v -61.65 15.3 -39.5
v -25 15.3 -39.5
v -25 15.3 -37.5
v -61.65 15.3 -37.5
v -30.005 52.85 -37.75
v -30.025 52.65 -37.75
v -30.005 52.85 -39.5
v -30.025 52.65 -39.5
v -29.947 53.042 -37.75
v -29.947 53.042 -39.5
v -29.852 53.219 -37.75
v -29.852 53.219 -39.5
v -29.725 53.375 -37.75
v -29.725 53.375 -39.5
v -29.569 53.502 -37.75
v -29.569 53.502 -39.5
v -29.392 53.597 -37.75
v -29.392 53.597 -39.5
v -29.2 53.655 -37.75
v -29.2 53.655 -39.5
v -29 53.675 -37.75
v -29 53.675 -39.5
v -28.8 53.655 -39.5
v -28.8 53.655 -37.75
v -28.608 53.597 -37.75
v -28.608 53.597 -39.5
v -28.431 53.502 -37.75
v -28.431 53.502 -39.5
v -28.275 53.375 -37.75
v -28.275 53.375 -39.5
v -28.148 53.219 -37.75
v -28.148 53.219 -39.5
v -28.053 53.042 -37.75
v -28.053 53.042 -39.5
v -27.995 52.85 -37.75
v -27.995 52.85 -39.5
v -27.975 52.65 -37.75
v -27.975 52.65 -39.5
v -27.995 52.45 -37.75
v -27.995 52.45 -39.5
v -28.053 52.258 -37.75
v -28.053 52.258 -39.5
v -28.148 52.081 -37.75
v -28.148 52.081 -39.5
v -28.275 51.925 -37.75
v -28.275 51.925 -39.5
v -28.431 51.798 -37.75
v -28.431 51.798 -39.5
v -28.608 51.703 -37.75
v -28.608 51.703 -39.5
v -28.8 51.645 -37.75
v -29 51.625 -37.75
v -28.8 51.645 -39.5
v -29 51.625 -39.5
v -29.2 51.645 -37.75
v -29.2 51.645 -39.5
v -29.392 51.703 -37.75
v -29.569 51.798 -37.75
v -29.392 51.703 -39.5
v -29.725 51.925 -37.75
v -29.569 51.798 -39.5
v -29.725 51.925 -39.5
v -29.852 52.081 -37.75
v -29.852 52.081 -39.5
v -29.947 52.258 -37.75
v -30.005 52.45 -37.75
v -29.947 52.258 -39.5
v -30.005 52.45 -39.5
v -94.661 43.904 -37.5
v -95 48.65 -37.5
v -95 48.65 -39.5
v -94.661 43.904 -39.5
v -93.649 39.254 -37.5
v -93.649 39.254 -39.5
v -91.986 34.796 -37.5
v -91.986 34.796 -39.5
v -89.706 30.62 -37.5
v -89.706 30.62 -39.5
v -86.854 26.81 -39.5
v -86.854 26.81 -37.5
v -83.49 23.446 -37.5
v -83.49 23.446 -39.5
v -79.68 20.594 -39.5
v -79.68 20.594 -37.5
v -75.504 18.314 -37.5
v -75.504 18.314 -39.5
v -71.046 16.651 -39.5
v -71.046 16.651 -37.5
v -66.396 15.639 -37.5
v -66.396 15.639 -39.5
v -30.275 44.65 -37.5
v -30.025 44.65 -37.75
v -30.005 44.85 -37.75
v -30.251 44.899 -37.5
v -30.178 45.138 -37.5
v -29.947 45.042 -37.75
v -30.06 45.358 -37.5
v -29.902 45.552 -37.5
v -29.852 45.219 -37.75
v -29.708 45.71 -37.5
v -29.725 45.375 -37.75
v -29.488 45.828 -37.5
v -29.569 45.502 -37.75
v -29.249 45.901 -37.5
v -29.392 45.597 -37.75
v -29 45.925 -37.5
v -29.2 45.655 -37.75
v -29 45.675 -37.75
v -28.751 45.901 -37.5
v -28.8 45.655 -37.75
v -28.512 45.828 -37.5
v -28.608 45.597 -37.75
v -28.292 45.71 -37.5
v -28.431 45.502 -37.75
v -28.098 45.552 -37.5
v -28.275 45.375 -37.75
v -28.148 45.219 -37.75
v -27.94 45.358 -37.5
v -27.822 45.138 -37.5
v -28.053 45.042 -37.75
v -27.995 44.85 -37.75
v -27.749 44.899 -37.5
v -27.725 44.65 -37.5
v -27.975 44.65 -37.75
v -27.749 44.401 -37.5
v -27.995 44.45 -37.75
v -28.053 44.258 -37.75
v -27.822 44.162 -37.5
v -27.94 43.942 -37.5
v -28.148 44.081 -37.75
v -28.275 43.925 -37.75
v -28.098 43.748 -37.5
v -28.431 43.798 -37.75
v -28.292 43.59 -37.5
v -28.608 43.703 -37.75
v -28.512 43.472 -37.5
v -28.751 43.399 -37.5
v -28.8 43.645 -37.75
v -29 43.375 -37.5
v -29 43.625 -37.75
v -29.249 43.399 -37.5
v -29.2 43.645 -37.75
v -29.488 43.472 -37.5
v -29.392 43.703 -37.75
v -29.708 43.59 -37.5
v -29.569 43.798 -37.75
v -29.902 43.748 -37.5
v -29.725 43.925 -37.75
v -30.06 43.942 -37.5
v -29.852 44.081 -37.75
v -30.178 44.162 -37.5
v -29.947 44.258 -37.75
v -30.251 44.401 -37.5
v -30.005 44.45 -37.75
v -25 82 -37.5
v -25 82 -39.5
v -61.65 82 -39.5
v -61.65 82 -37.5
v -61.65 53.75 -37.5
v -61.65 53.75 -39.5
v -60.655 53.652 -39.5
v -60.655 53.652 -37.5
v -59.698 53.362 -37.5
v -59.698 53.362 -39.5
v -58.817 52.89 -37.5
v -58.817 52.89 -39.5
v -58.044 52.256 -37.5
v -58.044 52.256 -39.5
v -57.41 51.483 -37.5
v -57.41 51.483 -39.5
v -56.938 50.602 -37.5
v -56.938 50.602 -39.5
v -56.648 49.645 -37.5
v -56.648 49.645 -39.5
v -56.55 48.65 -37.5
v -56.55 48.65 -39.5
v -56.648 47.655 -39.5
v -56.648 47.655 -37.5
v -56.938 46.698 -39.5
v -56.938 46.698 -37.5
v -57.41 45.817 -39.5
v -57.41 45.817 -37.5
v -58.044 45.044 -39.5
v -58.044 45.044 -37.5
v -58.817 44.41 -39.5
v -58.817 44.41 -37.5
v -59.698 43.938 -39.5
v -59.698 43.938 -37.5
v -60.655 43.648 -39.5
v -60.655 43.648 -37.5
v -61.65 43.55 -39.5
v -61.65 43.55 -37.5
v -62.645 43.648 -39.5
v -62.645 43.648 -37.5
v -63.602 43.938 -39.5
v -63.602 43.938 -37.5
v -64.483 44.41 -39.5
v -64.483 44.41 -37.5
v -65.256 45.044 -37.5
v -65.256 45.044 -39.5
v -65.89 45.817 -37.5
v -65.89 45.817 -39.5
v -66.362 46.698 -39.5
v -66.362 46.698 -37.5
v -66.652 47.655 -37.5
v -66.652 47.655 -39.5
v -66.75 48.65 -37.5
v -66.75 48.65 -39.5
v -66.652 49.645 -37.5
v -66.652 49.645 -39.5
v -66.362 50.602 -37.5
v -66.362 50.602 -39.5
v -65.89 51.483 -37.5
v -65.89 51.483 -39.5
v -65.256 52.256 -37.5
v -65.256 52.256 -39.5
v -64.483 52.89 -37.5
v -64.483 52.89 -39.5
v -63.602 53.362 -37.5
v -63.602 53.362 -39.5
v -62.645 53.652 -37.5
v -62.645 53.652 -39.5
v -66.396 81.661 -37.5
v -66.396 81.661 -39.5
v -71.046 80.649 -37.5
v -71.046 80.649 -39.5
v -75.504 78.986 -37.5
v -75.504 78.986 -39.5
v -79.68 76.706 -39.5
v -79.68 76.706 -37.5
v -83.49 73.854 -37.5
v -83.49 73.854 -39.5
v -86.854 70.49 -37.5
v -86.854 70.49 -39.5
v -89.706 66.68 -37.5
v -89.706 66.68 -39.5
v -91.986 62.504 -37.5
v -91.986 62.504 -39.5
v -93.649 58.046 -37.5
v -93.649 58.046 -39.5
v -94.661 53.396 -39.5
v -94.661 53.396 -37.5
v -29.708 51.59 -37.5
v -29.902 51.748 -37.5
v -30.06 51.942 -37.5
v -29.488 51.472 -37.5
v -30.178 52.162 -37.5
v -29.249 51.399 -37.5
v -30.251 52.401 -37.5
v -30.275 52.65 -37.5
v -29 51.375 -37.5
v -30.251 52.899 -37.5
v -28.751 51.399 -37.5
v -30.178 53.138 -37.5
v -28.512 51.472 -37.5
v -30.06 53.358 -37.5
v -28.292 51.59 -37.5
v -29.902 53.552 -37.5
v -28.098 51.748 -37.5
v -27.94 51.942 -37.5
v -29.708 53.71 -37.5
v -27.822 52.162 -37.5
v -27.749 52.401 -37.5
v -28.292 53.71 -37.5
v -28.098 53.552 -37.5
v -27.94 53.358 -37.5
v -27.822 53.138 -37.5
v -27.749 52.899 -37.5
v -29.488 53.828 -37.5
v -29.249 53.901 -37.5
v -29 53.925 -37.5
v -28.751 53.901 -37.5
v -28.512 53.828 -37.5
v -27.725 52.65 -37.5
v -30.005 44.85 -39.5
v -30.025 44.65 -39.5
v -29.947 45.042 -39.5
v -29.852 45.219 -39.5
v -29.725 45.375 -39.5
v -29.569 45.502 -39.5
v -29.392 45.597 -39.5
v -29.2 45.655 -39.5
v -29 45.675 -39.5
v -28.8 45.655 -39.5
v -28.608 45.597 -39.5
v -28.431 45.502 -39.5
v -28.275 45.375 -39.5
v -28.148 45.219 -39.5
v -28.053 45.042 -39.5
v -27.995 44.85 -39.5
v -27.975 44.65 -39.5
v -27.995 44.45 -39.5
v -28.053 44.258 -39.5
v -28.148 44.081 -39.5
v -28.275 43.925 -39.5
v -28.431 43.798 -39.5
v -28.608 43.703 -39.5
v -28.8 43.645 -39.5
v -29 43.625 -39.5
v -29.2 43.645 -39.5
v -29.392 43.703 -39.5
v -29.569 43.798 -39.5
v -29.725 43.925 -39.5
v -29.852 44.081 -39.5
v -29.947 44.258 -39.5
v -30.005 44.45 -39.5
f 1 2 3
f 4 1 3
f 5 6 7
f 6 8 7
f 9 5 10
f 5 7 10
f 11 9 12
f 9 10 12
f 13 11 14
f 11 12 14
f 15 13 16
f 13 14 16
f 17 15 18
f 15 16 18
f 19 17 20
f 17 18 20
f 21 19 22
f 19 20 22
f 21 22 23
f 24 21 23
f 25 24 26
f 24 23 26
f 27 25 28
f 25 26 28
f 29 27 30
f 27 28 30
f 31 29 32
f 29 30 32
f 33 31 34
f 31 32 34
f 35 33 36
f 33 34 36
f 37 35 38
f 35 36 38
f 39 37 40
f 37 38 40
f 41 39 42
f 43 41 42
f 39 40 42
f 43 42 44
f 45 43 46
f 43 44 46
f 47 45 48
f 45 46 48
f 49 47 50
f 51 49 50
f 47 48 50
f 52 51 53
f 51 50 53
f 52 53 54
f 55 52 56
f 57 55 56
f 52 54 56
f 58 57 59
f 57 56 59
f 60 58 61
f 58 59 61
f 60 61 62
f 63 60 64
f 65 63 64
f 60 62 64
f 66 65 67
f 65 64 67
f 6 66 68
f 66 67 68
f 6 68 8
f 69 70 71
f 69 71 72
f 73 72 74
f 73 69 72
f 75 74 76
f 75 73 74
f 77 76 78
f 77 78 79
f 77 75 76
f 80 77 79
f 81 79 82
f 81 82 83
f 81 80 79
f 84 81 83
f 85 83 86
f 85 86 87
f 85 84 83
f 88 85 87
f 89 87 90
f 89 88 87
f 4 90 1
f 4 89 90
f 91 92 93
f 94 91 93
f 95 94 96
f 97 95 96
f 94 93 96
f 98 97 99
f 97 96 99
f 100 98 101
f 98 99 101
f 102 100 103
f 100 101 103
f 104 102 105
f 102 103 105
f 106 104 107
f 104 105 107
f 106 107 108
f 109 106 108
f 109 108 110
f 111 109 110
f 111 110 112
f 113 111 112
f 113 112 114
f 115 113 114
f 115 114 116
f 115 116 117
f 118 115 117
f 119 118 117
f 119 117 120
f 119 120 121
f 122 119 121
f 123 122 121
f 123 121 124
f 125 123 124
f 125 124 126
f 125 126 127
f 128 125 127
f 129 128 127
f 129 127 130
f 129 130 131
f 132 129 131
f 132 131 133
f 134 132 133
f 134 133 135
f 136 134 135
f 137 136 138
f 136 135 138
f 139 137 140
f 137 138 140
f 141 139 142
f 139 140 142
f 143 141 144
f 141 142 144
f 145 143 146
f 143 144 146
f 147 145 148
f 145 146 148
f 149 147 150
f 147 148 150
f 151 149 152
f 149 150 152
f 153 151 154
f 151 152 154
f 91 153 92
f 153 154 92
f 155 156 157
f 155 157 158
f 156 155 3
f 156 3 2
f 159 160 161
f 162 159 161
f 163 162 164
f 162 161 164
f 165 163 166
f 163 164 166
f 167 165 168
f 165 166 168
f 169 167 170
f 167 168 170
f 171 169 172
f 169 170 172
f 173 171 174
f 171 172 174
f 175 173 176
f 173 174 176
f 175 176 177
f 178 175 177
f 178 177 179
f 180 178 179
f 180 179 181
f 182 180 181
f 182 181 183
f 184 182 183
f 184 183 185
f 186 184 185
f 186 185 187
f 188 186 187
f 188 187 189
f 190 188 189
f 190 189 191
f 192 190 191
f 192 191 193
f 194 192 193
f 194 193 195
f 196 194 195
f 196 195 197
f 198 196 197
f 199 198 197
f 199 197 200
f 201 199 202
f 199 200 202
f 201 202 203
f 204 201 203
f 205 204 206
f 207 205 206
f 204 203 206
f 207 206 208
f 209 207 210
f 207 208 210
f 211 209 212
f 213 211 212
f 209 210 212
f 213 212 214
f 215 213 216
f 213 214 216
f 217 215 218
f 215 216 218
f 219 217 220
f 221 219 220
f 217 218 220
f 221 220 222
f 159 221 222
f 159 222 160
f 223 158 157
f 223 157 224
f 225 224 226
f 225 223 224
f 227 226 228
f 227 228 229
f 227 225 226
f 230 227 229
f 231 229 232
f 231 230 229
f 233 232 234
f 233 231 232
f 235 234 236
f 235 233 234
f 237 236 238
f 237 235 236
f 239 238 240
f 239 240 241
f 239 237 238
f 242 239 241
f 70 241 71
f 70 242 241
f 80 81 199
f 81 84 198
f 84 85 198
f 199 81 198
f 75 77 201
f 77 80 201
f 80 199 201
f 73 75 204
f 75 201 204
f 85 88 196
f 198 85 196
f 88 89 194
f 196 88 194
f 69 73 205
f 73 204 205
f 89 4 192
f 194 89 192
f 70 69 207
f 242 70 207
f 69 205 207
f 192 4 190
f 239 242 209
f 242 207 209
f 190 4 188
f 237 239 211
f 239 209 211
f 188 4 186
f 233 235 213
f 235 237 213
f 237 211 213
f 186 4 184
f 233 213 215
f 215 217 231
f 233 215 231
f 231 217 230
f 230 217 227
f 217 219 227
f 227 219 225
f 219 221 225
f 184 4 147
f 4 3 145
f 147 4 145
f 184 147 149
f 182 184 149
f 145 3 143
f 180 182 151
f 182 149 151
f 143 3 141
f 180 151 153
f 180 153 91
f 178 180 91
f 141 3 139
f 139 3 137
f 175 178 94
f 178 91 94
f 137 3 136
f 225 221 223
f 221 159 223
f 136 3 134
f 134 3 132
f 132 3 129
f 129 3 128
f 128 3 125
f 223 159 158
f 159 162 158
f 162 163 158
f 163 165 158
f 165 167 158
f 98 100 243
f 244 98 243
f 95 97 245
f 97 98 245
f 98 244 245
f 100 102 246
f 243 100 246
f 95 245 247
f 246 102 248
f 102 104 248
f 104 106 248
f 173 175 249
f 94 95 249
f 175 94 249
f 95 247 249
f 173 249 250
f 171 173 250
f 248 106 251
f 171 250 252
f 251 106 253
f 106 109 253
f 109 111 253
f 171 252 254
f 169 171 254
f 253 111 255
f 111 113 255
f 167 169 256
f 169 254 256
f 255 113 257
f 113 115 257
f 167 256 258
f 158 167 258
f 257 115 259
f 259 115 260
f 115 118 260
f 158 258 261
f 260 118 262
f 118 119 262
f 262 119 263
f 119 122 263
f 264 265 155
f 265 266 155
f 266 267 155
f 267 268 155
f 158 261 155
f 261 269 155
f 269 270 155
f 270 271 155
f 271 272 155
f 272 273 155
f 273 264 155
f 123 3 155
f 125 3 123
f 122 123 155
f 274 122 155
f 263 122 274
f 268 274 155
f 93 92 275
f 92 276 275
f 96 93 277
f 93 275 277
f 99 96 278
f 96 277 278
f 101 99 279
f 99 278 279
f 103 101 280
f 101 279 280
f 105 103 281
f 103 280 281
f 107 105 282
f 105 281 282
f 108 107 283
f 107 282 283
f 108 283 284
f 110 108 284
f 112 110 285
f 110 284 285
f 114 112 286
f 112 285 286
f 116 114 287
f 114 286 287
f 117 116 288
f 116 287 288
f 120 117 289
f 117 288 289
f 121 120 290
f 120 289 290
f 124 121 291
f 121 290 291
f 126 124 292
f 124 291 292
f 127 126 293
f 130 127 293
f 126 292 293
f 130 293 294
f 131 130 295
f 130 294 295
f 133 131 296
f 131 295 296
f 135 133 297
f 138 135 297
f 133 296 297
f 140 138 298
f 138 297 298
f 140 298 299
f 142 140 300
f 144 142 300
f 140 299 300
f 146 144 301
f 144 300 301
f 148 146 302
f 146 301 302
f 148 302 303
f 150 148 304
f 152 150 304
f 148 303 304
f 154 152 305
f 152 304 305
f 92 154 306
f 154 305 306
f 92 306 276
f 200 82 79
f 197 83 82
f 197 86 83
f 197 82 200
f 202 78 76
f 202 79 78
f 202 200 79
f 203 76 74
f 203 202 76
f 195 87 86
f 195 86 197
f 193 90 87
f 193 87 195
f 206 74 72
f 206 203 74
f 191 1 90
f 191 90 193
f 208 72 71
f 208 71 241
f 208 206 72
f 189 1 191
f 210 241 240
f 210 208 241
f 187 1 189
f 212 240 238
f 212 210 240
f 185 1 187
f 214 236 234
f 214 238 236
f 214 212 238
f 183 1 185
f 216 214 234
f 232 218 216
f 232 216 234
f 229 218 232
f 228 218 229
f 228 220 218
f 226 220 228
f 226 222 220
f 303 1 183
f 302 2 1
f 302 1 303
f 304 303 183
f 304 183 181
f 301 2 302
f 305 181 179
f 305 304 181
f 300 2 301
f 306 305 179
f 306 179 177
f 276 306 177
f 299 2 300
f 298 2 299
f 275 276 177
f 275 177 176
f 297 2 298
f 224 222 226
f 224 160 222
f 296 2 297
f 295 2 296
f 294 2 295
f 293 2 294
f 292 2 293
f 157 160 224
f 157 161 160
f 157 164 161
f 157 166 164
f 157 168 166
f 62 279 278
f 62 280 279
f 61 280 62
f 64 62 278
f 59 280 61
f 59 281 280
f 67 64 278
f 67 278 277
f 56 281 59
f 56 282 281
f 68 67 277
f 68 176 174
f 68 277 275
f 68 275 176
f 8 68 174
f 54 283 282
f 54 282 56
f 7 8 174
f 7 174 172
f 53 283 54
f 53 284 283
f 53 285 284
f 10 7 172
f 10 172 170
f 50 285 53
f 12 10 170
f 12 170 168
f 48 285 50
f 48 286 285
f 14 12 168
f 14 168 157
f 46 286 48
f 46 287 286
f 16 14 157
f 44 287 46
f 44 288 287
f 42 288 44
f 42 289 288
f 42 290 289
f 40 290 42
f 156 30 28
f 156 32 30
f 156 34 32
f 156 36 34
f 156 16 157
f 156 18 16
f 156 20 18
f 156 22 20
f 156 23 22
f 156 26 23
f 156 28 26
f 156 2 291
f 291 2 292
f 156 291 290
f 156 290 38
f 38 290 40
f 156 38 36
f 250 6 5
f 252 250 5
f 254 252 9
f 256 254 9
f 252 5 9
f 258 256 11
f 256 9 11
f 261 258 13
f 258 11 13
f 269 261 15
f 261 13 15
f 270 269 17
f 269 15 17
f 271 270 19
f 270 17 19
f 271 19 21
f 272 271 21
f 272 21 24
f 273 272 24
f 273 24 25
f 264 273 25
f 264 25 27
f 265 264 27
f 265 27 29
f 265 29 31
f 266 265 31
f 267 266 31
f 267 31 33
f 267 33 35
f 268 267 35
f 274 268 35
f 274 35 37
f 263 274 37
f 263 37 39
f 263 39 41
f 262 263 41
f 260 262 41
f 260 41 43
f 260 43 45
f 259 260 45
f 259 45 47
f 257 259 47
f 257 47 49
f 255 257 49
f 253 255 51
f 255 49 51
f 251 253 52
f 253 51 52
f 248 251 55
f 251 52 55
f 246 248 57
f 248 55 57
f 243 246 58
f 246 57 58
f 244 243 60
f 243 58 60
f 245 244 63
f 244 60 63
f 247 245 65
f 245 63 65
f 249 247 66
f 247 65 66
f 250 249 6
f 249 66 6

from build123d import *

# Parameters (mm, degrees)
SKETCH_1_W                     = 50
SKETCH_1_H                     = 100
EXTRUDE_1_DEPTH                = 2
SKETCH_2_W                     = 3
SKETCH_2_H                     = 100
EXTRUDE_2_DEPTH                = 80
SKETCH_3_W                     = 2
SKETCH_3_H                     = 66.7
EXTRUDE_3_DEPTH                = 70
CUT_EXTRUDE_4_REACH            = 162.465
SKETCH_8_W                     = 2
SKETCH_8_H                     = 66.7
EXTRUDE_4_DEPTH                = 70
CUT_EXTRUDE_5_REACH            = 140.25
HOLE_WIZARD_M3_1_D             = 2.5
HOLE_WIZARD_M3_1_DEPTH         = 2
HOLE_WIZARD_M3_1_CSINK_D       = 3.05
HOLE_WIZARD_M3_1_CSINK_ANGLE   = 90
FILLET_1_R                     = 2
CUT_EXTRUDE_6_REACH            = 140.25
SKETCH_12_R                    = 11
CUT_EXTRUDE_7_REACH            = 162.465
SKETCH_13_R                    = 14.5
SKETCH_14_W                    = 2
SKETCH_14_H                    = 66.7
EXTRUDE_5_DEPTH                = 70
CUT_EXTRUDE_8_REACH            = 156.14
SKETCH_15_R                    = 5.1
CUT_EXTRUDE_9_DEPTH            = 155.140358116
CUT_EXTRUDE_9_DEPTH_BACK       = 155.140358116
SKETCH_19_W                    = 2
SKETCH_19_H                    = 66.7
CUT_EXTRUDE_10_DEPTH           = 119.844436134
FILLET_2_R                     = 2
CUT_EXTRUDE_11_DEPTH           = 134.88427839
CUT_EXTRUDE_11_DEPTH_BACK      = 134.88427839
HOLE_WIZARD_M2_5_1_D           = 2.05
HOLE_WIZARD_M2_5_1_CSINK_D     = 2.55
HOLE_WIZARD_M2_5_1_CSINK_ANGLE = 90


with BuildPart() as part:
    # 草图1 → 凸台-拉伸1 (new body)
    with BuildSketch(Plane(origin=(0, 0, 0), x_dir=(1, 0, 0), z_dir=(0, 1, 0))):
        Rectangle(SKETCH_1_W, SKETCH_1_H)
    extrude(amount=EXTRUDE_1_DEPTH)

    # 草图2 → 凸台-拉伸2 (add)
    with BuildSketch(Plane(origin=(0, 2, 0), x_dir=(1, 0, 0), z_dir=(0, 1, 0))):
        with Locations((-23.5, 0)):
            Rectangle(SKETCH_2_W, SKETCH_2_H)
    extrude(amount=EXTRUDE_2_DEPTH)

    # 草图3 → 凸台-拉伸3 (add)
    with BuildSketch(Plane.ZY.offset(25)):
        with Locations((-49, 48.65)):
            Rectangle(SKETCH_3_W, SKETCH_3_H)
    extrude(amount=EXTRUDE_3_DEPTH)

    # 草图4 → 切除-拉伸4 (cut, up to next)
    with BuildSketch(Plane(origin=(0, 0, -50), x_dir=(-1, 0, 0), z_dir=(0, 0, -1)), mode=Mode.PRIVATE) as cut_extrude_4_sk1:
        with BuildLine():
            Line((95, 82), (61.65, 82))
            ThreePointArc((61.65, 82), (85.232011153, 72.232011153), (95, 48.65))
            Line((95, 48.65), (95, 82))
        make_face()
    cut_extrude_4_tool1 = extrude(cut_extrude_4_sk1.sketch, amount=-CUT_EXTRUDE_4_REACH, mode=Mode.PRIVATE) & part.part
    # 草图4 → 切除-拉伸4 (cut, up to next)
    with BuildSketch(Plane(origin=(0, 0, -50), x_dir=(-1, 0, 0), z_dir=(0, 0, -1)), mode=Mode.PRIVATE) as cut_extrude_4_sk2:
        with BuildLine():
            ThreePointArc((95, 48.65), (85.232011153, 25.067988847), (61.65, 15.3))
            Line((61.65, 15.3), (95, 15.3))
            Line((95, 15.3), (95, 48.65))
        make_face()
    cut_extrude_4_tool2 = extrude(cut_extrude_4_sk2.sketch, amount=-CUT_EXTRUDE_4_REACH, mode=Mode.PRIVATE) & part.part
    add(cut_extrude_4_tool1.solids().sort_by_distance((-87.550679, 74.550679, -50))[0], mode=Mode.SUBTRACT)
    add(cut_extrude_4_tool2.solids().sort_by_distance((-87.550679, 22.749321, -50))[0], mode=Mode.SUBTRACT)

    # 草图8 → 凸台-拉伸4 (add)
    with BuildSketch(Plane.ZY.offset(25)):
        with Locations((7, 48.65)):
            Rectangle(SKETCH_8_W, SKETCH_8_H)
    extrude(amount=EXTRUDE_4_DEPTH)

    # 草图9 → 切除-拉伸5 (cut, up to next)
    with BuildSketch(Plane.XY.offset(8), mode=Mode.PRIVATE) as cut_extrude_5_sk1:
        with BuildLine():
            ThreePointArc((-95, 48.65), (-85.232011153, 72.232011153), (-61.65, 82))
            Line((-61.65, 82), (-95, 82))
            Line((-95, 82), (-95, 48.65))
        make_face()
    cut_extrude_5_tool1 = extrude(cut_extrude_5_sk1.sketch, amount=-CUT_EXTRUDE_5_REACH, mode=Mode.PRIVATE) & part.part
    # 草图9 → 切除-拉伸5 (cut, up to next)
    with BuildSketch(Plane.XY.offset(8), mode=Mode.PRIVATE) as cut_extrude_5_sk2:
        with BuildLine():
            ThreePointArc((-61.65, 15.3), (-85.232011153, 25.067988847), (-95, 48.65))
            Line((-95, 48.65), (-95, 15.3))
            Line((-95, 15.3), (-61.65, 15.3))
        make_face()
    cut_extrude_5_tool2 = extrude(cut_extrude_5_sk2.sketch, amount=-CUT_EXTRUDE_5_REACH, mode=Mode.PRIVATE) & part.part
    add(cut_extrude_5_tool1.solids().sort_by_distance((-87.550679, 74.550679, 8))[0], mode=Mode.SUBTRACT)
    add(cut_extrude_5_tool2.solids().sort_by_distance((-87.550679, 22.749321, 8))[0], mode=Mode.SUBTRACT)

    # M3 螺纹孔1
    with Locations(Plane.XY.offset(8)):
        with Locations((-78.970508076, 38.65), (-61.65, 68.65), (-44.329491924, 38.65)):
            CounterSinkHole(HOLE_WIZARD_M3_1_D / 2, HOLE_WIZARD_M3_1_CSINK_D / 2, depth=HOLE_WIZARD_M3_1_DEPTH, counter_sink_angle=HOLE_WIZARD_M3_1_CSINK_ANGLE)

    # 圆角1
    fillet_1_edges = [part.edges().sort_by_distance(p)[0] for p in [
        (-23.5, 82, 50),
        (25, 1, 50),
        (25, 1, -50),
    ]]
    fillet(fillet_1_edges, radius=FILLET_1_R)

    # 草图12 → 切除-拉伸6 (cut, up to next)
    with BuildSketch(Plane.XY.offset(8), mode=Mode.PRIVATE) as cut_extrude_6_sk1:
        with Locations((-61.65, 48.65)):
            Circle(SKETCH_12_R)
    cut_extrude_6_tool1 = extrude(cut_extrude_6_sk1.sketch, amount=-CUT_EXTRUDE_6_REACH, mode=Mode.PRIVATE) & part.part
    add(cut_extrude_6_tool1.solids().sort_by_distance((-61.65, 48.65, 8))[0], mode=Mode.SUBTRACT)

    # 草图13 → 切除-拉伸7 (cut, up to next)
    with BuildSketch(Plane(origin=(0, 0, -50), x_dir=(-1, 0, 0), z_dir=(0, 0, -1)), mode=Mode.PRIVATE) as cut_extrude_7_sk1:
        with Locations((61.65, 48.65)):
            Circle(SKETCH_13_R)
    cut_extrude_7_tool1 = extrude(cut_extrude_7_sk1.sketch, amount=-CUT_EXTRUDE_7_REACH, mode=Mode.PRIVATE) & part.part
    add(cut_extrude_7_tool1.solids().sort_by_distance((-61.65, 48.65, -50))[0], mode=Mode.SUBTRACT)

    # 草图14 → 凸台-拉伸5 (add)
    with BuildSketch(Plane.ZY.offset(25)):
        with Locations((-38.5, 48.65)):
            Rectangle(SKETCH_14_W, SKETCH_14_H)
    extrude(amount=EXTRUDE_5_DEPTH)

    # 草图15 → 切除-拉伸8 (cut, up to next)
    with BuildSketch(Plane(origin=(0, 0, -39.5), x_dir=(-1, 0, 0), z_dir=(0, 0, -1)), mode=Mode.PRIVATE) as cut_extrude_8_sk1:
        with Locations(Location((61.65, 48.65, 0), (0, 0, 90))):
            Circle(SKETCH_15_R)
    cut_extrude_8_tool1 = extrude(cut_extrude_8_sk1.sketch, amount=-CUT_EXTRUDE_8_REACH, mode=Mode.PRIVATE) & part.part
    add(cut_extrude_8_tool1.solids().sort_by_distance((-61.65, 48.65, -39.5))[0], mode=Mode.SUBTRACT)

    # 草图18 → 切除-拉伸9 (cut, two sides: drawn at the far end of the back side and taken through both)
    with BuildSketch(Plane(origin=(0, 0, -39.5), x_dir=(-1, 0, 0), z_dir=(0, 0, -1)).offset(-CUT_EXTRUDE_9_DEPTH_BACK)):
        with BuildLine():
            Line((95, 15.3), (95, 48.65))
            ThreePointArc((95, 48.65), (85.232011153, 25.067988847), (61.65, 15.3))
            Line((61.65, 15.3), (95, 15.3))
        make_face()
        with BuildLine():
            Line((95, 48.65), (95, 82))
            Line((95, 82), (61.65, 82))
            ThreePointArc((61.65, 82), (85.232011153, 72.232011153), (95, 48.65))
        make_face()
    extrude(amount=CUT_EXTRUDE_9_DEPTH + CUT_EXTRUDE_9_DEPTH_BACK, mode=Mode.SUBTRACT)

    # 草图19 → 切除-拉伸10 (cut, through all)
    with BuildSketch(Plane.ZY.offset(25)):
        with Locations((-49, 48.65)):
            Rectangle(SKETCH_19_W, SKETCH_19_H)
    extrude(amount=CUT_EXTRUDE_10_DEPTH, mode=Mode.SUBTRACT)

    # 圆角2
    fillet_2_edges = [part.edges().sort_by_distance(p)[0] for p in [
        (-23.5, 82, -50),
    ]]
    fillet(fillet_2_edges, radius=FILLET_2_R)

    # 草图20 → 切除-拉伸11 (cut, two sides: drawn at the far end of the back side and taken through both)
    with BuildSketch(Plane(origin=(0, 2, 0), x_dir=(1, 0, 0), z_dir=(0, 1, 0)).offset(-CUT_EXTRUDE_11_DEPTH_BACK)):
        Polygon((-25, -8), (-95, -8), (-95, -6), (-25, -6), (-25, 50), (25, 50), (25, -50), (-25, -50), align=None)
    extrude(amount=CUT_EXTRUDE_11_DEPTH + CUT_EXTRUDE_11_DEPTH_BACK, mode=Mode.SUBTRACT)

    # M2.5 螺纹孔1 (through all)
    with Locations(Plane.XY.offset(-37.5)):
        with Locations((-29, 52.65), (-29, 44.65)):
            CounterSinkHole(HOLE_WIZARD_M2_5_1_D / 2, HOLE_WIZARD_M2_5_1_CSINK_D / 2, counter_sink_angle=HOLE_WIZARD_M2_5_1_CSINK_ANGLE)


solid = part.part
